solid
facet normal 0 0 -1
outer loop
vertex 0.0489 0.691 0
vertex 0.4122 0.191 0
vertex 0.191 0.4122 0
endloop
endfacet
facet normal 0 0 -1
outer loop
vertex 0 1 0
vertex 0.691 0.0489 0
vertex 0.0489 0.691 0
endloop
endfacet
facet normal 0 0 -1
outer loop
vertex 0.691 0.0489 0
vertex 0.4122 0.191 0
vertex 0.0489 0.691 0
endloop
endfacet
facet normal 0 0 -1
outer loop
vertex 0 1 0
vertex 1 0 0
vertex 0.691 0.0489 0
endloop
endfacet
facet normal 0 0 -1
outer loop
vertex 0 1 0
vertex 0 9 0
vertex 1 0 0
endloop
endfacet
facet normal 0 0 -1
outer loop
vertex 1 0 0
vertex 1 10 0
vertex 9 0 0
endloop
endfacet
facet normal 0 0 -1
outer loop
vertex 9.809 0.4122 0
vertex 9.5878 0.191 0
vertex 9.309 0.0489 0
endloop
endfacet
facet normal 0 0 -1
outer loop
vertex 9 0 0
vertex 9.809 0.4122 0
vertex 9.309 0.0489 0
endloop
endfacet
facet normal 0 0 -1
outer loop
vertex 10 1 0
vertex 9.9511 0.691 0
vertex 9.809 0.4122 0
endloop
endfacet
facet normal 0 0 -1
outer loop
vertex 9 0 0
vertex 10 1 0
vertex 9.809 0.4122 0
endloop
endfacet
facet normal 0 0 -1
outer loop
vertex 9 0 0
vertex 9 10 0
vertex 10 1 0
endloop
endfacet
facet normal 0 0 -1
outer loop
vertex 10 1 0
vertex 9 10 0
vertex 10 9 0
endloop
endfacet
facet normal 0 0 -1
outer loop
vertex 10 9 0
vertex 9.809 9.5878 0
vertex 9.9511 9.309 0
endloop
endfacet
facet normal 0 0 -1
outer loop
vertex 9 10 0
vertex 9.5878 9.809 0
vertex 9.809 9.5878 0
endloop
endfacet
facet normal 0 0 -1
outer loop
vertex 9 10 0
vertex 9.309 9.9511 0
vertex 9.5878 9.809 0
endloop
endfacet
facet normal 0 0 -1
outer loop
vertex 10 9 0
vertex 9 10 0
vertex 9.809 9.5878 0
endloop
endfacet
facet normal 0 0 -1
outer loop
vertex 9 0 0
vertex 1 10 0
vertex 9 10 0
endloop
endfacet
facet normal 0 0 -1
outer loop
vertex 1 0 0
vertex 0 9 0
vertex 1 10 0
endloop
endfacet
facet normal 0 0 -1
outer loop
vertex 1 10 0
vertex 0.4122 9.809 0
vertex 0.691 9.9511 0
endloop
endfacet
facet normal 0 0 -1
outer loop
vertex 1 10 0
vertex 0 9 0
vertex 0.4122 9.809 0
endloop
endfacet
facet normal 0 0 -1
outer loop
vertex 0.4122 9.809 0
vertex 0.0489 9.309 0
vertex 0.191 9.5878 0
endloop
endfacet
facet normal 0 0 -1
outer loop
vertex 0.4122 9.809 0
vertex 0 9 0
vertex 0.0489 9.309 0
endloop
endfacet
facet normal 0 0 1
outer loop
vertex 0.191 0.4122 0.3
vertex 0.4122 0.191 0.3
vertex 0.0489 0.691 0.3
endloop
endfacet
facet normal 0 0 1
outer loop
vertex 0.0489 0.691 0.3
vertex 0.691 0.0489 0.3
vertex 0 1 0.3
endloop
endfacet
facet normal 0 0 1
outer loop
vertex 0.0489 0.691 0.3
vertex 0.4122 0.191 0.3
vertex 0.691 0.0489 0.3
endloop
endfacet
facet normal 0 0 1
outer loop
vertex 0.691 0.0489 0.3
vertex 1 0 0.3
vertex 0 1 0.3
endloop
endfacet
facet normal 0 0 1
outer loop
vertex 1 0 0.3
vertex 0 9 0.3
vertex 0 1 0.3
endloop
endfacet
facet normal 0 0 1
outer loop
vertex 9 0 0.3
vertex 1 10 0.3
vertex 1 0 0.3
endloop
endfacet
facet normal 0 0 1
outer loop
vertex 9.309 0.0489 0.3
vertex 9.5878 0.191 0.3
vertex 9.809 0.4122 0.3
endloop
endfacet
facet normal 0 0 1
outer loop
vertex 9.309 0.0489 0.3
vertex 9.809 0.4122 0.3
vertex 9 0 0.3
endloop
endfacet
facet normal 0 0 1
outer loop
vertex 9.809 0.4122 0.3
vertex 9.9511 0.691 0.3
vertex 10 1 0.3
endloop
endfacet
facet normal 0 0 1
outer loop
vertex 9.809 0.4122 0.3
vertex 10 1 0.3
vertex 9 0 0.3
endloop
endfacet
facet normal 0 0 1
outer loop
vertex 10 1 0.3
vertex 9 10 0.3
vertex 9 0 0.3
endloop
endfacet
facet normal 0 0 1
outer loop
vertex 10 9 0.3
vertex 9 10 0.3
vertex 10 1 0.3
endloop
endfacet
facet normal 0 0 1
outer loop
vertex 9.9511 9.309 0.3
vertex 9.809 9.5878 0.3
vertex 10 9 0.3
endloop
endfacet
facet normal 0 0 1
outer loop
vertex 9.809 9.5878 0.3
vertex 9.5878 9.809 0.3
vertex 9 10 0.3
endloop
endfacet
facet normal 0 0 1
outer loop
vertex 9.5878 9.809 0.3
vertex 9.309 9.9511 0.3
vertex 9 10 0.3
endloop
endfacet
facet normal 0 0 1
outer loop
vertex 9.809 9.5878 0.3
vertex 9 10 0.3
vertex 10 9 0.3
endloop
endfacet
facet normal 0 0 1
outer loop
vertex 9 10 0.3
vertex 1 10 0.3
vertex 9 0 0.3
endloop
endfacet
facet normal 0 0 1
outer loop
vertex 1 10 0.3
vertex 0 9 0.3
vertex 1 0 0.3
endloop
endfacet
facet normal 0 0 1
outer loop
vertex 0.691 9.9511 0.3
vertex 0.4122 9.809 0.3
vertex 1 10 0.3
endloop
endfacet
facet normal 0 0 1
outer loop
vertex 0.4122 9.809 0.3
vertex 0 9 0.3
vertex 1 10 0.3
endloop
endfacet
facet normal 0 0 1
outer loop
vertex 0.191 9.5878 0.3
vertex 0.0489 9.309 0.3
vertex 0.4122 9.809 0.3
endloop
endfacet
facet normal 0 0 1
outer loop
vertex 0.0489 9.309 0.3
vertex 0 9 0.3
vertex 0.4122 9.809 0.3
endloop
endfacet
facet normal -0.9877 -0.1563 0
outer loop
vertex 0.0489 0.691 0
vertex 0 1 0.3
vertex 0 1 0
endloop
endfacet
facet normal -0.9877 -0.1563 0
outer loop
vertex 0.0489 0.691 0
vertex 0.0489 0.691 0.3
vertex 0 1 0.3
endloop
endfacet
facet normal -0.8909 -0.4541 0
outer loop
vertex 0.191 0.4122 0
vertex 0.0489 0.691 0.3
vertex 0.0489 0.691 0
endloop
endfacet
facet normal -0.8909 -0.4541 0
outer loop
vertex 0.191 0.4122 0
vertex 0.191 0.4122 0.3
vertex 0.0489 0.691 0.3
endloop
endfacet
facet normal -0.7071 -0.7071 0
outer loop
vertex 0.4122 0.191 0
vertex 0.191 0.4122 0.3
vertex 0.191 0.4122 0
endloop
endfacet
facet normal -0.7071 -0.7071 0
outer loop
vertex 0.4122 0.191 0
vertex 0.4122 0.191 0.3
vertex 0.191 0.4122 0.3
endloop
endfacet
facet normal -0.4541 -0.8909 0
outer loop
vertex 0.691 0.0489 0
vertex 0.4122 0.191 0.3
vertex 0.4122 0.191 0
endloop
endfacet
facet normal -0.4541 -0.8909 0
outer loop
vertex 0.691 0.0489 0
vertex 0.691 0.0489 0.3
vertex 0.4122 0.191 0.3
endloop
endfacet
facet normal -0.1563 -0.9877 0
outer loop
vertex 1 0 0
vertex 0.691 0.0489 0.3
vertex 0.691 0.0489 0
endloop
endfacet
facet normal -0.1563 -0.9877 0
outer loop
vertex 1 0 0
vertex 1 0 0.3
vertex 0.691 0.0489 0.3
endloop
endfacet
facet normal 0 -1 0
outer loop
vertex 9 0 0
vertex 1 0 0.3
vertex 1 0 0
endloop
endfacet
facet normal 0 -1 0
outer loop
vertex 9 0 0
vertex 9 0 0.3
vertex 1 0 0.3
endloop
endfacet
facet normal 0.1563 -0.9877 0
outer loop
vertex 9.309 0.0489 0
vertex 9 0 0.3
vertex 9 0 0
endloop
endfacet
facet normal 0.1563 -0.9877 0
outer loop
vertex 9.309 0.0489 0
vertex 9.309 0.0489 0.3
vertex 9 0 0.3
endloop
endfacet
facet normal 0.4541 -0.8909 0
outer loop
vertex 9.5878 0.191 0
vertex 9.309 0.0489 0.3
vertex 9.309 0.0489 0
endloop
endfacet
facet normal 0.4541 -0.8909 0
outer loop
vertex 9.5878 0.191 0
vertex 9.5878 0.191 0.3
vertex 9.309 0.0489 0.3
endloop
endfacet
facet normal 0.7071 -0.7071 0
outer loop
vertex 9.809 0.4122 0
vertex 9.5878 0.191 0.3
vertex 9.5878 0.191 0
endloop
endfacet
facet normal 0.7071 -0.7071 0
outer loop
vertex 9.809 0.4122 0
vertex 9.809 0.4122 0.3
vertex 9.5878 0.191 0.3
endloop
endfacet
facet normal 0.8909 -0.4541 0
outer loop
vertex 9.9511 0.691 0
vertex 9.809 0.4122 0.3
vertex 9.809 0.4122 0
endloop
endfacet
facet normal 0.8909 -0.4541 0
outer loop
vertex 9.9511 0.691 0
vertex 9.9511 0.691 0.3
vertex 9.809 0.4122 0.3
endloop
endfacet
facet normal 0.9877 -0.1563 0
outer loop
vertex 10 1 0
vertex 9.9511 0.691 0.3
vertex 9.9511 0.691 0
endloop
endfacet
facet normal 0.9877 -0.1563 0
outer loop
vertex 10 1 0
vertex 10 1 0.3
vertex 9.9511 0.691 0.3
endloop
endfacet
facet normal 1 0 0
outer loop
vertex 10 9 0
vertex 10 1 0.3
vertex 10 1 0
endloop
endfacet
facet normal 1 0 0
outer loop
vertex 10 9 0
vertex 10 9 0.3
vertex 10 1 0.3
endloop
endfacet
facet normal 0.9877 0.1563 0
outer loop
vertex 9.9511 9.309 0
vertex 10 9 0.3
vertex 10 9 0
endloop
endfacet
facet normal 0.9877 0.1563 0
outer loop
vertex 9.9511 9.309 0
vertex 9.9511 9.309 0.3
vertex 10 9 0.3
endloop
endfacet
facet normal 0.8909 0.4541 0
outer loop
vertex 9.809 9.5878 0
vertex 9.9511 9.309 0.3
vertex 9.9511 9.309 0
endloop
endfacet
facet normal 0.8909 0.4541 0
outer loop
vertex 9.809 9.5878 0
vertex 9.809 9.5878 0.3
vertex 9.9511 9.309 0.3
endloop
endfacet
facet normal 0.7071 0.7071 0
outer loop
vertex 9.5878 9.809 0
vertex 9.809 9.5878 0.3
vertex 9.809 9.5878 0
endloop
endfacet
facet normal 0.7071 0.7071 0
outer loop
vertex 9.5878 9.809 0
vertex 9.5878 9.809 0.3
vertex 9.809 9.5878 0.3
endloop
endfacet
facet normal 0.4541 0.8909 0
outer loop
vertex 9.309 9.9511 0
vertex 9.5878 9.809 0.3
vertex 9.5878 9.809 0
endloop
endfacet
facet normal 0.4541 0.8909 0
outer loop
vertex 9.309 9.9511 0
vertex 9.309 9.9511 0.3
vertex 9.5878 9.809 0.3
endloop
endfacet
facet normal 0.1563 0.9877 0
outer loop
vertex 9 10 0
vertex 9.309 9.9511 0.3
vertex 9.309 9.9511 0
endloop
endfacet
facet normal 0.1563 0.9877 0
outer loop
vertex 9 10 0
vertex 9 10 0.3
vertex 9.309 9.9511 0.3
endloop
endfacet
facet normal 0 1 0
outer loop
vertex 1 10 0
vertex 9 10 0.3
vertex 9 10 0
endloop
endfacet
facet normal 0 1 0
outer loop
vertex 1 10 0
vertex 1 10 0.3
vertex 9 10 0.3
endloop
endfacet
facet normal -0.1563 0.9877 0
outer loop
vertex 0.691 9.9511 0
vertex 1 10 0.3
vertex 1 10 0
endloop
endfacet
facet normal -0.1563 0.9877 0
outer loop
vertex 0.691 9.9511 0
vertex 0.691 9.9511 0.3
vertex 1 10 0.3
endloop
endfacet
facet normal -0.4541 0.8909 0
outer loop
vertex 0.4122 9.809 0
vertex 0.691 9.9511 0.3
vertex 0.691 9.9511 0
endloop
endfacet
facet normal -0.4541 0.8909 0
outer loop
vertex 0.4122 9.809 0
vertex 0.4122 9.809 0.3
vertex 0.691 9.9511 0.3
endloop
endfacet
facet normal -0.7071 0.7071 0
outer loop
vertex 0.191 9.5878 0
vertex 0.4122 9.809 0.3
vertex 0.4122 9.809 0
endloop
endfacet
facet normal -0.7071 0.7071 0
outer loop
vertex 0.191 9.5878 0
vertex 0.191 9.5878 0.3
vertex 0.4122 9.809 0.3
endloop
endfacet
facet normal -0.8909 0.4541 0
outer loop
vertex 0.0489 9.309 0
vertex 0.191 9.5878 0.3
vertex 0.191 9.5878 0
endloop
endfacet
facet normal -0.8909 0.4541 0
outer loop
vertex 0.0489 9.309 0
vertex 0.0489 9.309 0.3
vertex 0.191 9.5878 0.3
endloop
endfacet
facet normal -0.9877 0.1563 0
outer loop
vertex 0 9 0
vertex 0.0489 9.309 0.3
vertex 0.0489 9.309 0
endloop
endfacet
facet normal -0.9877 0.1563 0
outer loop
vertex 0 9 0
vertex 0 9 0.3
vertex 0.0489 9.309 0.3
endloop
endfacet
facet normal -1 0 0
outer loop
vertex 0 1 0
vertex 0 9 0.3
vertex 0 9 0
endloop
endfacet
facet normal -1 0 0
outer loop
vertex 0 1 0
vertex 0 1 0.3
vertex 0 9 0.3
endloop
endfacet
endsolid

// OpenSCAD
$fn=20;
translate([1,1,0]) linear_extrude(height=0.3) hull() {
   circle(r=1);
   translate([0,8,0]) circle(r=1);
   translate([8,8,0]) circle(r=1);
   translate([8,0,0]) circle(r=1);
}
